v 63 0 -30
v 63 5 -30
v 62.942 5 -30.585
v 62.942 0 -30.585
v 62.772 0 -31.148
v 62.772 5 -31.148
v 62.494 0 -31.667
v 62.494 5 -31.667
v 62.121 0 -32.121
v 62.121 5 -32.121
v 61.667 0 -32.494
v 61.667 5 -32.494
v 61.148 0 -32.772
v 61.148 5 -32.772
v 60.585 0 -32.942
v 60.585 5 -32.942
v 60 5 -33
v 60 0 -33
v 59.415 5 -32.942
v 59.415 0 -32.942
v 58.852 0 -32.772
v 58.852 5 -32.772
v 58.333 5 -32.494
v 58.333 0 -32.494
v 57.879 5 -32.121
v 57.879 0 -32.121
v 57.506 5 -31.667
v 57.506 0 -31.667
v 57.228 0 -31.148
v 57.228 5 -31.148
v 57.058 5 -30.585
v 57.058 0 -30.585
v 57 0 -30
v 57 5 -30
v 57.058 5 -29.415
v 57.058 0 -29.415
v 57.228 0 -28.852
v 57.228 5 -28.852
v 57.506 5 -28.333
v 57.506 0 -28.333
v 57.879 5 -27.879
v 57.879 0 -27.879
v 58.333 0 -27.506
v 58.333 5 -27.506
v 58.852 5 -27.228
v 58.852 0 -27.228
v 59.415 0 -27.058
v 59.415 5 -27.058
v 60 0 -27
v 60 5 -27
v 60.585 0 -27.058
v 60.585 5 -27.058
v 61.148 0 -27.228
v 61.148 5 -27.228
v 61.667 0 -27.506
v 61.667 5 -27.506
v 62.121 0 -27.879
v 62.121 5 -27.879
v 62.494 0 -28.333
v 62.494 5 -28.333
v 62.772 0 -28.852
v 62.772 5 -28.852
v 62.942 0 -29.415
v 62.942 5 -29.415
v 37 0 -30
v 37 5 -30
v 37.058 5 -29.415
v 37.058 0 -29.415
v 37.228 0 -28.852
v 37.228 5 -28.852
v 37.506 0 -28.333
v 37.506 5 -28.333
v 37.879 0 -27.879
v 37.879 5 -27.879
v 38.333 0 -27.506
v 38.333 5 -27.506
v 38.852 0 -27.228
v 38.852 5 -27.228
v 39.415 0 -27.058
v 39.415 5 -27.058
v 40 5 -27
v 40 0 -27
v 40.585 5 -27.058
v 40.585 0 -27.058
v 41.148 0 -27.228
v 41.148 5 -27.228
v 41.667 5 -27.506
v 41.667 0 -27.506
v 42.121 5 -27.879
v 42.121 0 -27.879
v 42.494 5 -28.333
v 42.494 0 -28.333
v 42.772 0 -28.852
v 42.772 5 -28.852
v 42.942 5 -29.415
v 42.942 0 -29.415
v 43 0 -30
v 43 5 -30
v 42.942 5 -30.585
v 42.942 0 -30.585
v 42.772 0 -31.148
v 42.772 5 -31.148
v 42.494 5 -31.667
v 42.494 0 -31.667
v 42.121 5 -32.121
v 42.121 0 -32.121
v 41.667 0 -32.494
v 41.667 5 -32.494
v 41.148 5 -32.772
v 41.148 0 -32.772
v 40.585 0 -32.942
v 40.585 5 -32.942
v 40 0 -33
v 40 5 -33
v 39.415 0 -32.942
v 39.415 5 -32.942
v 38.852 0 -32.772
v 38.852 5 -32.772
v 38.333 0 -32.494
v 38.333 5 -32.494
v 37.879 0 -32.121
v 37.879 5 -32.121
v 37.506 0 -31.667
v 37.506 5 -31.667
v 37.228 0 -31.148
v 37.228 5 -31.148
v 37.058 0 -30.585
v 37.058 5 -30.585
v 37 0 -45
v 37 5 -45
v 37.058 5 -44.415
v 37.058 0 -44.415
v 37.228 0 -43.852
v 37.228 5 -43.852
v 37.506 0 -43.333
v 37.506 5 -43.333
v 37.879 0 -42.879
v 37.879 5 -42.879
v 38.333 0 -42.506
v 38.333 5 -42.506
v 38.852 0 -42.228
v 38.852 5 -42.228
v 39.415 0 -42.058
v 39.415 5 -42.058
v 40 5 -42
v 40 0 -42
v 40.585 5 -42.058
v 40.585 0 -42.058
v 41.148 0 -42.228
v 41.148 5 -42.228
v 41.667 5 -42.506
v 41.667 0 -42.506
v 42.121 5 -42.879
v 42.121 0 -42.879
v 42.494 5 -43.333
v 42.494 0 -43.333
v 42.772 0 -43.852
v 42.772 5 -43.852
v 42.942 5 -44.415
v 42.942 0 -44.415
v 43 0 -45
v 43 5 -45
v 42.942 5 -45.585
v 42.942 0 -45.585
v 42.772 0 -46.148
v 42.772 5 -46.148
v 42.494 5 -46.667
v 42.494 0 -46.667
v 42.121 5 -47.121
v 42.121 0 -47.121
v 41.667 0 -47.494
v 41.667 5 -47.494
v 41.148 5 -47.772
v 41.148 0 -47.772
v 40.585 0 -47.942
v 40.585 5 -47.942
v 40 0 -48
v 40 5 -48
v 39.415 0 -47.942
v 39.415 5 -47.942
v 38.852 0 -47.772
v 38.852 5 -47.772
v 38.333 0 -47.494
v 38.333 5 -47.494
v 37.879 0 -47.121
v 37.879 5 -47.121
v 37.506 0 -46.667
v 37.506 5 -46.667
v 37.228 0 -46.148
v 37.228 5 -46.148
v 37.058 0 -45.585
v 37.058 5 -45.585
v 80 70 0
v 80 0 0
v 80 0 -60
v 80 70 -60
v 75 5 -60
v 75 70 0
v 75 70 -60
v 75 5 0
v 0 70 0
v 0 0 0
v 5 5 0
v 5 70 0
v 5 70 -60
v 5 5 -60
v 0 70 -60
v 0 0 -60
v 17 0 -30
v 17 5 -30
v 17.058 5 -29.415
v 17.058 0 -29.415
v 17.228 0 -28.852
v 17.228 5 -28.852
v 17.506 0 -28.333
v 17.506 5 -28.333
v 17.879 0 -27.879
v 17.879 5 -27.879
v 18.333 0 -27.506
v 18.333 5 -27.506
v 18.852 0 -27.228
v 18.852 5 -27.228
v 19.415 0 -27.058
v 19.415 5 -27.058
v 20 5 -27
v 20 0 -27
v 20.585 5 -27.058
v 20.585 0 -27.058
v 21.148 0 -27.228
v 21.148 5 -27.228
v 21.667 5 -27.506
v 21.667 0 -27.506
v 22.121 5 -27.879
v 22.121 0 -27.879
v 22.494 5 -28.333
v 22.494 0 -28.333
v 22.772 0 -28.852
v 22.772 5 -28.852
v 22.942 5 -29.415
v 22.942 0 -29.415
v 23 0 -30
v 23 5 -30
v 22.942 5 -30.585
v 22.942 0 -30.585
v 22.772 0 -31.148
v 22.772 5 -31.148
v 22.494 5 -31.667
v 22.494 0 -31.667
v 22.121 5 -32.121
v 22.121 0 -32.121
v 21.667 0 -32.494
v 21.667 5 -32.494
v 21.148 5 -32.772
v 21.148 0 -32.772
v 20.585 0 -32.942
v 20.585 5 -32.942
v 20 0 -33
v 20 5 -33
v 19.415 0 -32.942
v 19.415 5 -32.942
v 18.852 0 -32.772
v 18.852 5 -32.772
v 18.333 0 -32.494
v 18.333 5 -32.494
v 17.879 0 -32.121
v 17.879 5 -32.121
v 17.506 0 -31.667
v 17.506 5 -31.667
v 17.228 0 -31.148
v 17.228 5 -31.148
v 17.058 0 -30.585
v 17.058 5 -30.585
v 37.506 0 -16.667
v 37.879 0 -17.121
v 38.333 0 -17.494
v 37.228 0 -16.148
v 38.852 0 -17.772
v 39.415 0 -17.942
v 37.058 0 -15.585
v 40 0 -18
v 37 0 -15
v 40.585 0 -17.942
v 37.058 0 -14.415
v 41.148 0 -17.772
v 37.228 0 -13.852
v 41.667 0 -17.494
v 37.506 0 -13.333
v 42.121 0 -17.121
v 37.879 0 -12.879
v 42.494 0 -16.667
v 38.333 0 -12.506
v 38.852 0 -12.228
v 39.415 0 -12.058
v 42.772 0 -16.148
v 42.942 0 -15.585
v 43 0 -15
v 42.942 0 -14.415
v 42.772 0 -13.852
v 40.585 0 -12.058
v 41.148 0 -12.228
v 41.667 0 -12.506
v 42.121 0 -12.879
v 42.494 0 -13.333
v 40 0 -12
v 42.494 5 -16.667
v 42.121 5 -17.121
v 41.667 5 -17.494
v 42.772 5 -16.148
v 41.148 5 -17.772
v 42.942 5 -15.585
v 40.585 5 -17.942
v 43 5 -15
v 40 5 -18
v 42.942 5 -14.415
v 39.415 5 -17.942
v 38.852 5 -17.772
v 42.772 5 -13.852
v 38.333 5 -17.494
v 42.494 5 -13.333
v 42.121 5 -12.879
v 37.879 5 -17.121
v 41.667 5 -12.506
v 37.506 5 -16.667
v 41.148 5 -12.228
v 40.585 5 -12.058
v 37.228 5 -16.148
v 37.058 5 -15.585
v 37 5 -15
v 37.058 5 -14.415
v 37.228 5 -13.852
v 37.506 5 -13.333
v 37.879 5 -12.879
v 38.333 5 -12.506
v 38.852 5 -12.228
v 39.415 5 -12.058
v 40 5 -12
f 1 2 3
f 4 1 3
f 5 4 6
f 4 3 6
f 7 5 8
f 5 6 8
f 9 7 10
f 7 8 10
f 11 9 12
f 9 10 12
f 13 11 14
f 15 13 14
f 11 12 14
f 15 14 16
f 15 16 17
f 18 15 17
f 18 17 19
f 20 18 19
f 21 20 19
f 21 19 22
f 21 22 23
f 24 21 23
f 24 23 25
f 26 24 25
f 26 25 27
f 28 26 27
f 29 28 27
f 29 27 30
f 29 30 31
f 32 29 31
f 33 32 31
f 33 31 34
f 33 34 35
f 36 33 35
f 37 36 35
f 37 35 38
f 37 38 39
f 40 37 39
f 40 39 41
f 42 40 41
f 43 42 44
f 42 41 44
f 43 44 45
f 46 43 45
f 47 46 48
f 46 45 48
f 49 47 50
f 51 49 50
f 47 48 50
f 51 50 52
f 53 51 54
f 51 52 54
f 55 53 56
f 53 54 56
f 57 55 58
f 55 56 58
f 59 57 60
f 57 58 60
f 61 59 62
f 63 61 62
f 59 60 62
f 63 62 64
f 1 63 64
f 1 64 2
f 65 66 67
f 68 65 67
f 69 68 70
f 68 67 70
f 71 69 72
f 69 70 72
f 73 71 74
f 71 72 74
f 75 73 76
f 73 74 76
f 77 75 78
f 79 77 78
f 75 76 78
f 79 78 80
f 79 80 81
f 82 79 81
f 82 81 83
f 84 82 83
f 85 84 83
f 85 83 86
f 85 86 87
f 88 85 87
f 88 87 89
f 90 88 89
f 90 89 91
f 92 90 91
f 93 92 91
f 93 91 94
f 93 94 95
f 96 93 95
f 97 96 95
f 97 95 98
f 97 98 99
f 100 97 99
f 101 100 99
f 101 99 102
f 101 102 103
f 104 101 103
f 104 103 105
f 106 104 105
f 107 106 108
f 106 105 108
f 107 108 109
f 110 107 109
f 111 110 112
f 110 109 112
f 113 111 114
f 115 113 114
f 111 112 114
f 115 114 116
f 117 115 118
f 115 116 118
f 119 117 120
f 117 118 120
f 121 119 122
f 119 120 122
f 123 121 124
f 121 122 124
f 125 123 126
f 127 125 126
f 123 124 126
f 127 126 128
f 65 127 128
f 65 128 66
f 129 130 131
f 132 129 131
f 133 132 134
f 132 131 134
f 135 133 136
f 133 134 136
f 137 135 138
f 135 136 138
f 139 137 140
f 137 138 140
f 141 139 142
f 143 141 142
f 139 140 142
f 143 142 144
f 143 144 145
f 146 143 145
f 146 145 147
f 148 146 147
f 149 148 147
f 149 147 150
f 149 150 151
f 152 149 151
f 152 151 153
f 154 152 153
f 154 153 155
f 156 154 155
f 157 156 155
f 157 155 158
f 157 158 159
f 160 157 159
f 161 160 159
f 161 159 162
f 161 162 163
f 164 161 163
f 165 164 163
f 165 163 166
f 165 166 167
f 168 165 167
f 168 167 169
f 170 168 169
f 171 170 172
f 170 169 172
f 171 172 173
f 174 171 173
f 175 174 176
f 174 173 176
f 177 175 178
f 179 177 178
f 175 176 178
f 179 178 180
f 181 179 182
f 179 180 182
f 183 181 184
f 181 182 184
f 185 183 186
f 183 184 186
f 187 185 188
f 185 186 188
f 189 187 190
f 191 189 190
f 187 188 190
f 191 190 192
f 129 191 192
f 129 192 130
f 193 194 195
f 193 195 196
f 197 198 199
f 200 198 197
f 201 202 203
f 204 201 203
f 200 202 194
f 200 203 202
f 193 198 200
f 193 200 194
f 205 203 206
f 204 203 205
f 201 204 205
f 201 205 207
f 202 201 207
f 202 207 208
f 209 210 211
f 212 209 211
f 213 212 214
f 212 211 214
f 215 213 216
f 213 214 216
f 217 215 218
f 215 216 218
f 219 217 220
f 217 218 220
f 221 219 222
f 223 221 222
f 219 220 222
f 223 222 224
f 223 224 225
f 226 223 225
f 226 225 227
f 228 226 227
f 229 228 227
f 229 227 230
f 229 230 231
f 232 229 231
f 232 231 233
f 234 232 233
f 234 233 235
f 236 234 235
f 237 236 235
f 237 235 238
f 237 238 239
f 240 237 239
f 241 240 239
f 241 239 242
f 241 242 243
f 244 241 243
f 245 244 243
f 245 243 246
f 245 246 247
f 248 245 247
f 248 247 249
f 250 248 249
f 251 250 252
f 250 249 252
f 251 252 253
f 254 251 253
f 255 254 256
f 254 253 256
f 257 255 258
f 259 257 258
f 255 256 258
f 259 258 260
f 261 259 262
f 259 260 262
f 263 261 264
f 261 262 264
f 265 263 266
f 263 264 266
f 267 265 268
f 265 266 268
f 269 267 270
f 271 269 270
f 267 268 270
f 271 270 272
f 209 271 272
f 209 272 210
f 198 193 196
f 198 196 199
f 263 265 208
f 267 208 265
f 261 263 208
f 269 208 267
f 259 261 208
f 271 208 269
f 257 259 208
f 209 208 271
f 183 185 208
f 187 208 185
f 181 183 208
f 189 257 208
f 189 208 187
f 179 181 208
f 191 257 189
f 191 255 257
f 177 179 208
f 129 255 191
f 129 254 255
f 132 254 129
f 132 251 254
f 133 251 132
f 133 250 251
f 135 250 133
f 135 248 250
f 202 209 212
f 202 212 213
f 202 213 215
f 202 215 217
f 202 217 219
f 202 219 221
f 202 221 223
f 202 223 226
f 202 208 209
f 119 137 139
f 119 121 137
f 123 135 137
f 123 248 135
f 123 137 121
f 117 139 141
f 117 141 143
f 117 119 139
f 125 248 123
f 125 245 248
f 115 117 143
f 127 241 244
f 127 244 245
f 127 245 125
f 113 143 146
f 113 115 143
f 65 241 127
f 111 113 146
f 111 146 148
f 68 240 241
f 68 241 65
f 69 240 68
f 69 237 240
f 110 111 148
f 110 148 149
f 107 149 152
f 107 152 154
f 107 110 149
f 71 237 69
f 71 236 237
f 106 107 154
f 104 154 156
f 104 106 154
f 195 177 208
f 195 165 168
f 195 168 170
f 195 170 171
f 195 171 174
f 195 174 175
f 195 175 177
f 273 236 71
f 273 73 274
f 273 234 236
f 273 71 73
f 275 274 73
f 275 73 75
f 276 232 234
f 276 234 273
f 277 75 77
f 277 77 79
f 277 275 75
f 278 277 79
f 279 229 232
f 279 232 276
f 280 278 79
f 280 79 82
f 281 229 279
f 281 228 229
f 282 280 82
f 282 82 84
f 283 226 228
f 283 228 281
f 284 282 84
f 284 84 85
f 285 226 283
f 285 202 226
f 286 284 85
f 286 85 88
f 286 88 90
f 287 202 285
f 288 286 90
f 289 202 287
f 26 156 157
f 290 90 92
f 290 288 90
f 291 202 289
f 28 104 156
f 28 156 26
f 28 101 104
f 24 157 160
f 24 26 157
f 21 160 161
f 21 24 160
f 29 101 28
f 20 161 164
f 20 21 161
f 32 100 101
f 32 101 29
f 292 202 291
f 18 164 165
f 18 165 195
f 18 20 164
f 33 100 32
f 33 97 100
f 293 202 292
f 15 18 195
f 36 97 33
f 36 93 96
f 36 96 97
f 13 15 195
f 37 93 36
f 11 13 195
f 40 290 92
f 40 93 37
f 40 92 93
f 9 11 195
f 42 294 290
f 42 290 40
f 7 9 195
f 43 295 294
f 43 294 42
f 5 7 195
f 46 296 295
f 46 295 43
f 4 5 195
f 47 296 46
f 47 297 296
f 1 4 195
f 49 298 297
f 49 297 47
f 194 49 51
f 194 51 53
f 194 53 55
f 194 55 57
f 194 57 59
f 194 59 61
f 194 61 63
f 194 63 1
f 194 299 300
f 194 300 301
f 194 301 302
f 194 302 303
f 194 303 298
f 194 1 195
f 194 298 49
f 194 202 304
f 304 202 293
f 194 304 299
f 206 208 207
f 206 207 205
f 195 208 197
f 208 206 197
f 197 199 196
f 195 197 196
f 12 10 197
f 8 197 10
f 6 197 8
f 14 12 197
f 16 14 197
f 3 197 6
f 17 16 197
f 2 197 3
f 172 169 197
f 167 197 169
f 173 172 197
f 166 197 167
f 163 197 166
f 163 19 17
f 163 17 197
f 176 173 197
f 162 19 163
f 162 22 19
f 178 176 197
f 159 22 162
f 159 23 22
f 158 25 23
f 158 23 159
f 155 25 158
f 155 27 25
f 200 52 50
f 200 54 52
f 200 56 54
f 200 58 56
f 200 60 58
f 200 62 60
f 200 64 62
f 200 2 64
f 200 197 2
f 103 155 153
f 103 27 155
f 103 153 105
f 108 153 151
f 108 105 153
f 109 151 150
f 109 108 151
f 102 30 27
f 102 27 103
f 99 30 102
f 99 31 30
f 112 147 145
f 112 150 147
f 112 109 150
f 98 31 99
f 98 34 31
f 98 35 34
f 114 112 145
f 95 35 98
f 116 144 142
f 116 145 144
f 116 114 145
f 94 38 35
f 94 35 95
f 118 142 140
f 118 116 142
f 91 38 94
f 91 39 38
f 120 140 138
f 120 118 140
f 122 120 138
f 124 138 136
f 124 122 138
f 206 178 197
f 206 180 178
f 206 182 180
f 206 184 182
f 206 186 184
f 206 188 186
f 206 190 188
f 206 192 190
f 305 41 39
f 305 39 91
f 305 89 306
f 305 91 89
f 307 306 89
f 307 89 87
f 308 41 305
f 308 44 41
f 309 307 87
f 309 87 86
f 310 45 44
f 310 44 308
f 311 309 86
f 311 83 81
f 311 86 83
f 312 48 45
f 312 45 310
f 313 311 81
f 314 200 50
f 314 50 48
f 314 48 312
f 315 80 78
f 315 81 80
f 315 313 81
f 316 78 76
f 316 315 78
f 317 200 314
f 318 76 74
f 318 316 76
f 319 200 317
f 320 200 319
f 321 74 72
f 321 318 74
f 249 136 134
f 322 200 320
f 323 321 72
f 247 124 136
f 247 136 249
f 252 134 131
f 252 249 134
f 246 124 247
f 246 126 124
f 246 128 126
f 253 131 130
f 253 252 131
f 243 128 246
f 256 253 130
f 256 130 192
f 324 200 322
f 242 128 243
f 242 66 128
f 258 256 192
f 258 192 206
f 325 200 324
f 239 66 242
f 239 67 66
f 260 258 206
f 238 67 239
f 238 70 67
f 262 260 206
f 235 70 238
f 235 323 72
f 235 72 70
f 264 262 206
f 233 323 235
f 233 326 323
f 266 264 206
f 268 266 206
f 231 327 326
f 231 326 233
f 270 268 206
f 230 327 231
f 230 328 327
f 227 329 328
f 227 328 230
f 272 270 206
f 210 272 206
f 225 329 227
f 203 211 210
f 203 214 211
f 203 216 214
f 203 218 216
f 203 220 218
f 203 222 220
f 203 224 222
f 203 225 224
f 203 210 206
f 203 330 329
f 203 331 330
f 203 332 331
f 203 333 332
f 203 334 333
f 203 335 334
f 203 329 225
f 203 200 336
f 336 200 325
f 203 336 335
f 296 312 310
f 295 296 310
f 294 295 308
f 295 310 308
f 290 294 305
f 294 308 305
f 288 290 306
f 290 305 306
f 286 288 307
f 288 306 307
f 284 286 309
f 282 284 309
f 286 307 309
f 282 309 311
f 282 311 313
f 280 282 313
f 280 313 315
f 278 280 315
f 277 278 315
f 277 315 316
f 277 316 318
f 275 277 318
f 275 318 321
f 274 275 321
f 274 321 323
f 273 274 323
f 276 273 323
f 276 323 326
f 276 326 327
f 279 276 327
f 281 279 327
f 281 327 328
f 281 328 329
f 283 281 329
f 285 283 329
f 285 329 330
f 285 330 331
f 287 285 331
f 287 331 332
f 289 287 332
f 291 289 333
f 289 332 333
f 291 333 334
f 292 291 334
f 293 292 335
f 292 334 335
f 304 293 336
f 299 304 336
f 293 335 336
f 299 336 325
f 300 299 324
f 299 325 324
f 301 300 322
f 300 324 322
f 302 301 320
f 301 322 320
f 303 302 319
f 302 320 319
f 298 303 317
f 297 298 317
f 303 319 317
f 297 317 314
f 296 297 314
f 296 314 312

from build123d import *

# Parameters (mm, degrees)
BOSS_EXTRUDE1_DEPTH = 60
SKETCH2_R           = 3
CUT_EXTRUDE1_DEPTH  = 120.268604419


with BuildPart() as part:
    # Sketch1 → Boss-Extrude1 (new body)
    with BuildSketch(Plane.XY):
        Polygon((0, 70), (0, 0), (80, 0), (80, 70), (75, 70), (75, 5), (5, 5), (5, 70), align=None)
    extrude(amount=-BOSS_EXTRUDE1_DEPTH)

    # Sketch2 → Cut-Extrude1 (cut, through all)
    with BuildSketch(Plane(origin=(0, 5, 0), x_dir=(1, 0, 0), z_dir=(0, 1, 0))):
        with Locations(Location((40, 30, 0), (0, 0, 180))):
            Circle(SKETCH2_R)
        with Locations(Location((20, 30, 0), (0, 0, 180))):
            Circle(SKETCH2_R)
        with Locations(Location((40, 45, 0), (0, 0, 180))):
            Circle(SKETCH2_R)
        with Locations((40, 15)):
            Circle(SKETCH2_R)
        with Locations((60, 30)):
            Circle(SKETCH2_R)
    extrude(amount=-CUT_EXTRUDE1_DEPTH, mode=Mode.SUBTRACT)


solid = part.part
